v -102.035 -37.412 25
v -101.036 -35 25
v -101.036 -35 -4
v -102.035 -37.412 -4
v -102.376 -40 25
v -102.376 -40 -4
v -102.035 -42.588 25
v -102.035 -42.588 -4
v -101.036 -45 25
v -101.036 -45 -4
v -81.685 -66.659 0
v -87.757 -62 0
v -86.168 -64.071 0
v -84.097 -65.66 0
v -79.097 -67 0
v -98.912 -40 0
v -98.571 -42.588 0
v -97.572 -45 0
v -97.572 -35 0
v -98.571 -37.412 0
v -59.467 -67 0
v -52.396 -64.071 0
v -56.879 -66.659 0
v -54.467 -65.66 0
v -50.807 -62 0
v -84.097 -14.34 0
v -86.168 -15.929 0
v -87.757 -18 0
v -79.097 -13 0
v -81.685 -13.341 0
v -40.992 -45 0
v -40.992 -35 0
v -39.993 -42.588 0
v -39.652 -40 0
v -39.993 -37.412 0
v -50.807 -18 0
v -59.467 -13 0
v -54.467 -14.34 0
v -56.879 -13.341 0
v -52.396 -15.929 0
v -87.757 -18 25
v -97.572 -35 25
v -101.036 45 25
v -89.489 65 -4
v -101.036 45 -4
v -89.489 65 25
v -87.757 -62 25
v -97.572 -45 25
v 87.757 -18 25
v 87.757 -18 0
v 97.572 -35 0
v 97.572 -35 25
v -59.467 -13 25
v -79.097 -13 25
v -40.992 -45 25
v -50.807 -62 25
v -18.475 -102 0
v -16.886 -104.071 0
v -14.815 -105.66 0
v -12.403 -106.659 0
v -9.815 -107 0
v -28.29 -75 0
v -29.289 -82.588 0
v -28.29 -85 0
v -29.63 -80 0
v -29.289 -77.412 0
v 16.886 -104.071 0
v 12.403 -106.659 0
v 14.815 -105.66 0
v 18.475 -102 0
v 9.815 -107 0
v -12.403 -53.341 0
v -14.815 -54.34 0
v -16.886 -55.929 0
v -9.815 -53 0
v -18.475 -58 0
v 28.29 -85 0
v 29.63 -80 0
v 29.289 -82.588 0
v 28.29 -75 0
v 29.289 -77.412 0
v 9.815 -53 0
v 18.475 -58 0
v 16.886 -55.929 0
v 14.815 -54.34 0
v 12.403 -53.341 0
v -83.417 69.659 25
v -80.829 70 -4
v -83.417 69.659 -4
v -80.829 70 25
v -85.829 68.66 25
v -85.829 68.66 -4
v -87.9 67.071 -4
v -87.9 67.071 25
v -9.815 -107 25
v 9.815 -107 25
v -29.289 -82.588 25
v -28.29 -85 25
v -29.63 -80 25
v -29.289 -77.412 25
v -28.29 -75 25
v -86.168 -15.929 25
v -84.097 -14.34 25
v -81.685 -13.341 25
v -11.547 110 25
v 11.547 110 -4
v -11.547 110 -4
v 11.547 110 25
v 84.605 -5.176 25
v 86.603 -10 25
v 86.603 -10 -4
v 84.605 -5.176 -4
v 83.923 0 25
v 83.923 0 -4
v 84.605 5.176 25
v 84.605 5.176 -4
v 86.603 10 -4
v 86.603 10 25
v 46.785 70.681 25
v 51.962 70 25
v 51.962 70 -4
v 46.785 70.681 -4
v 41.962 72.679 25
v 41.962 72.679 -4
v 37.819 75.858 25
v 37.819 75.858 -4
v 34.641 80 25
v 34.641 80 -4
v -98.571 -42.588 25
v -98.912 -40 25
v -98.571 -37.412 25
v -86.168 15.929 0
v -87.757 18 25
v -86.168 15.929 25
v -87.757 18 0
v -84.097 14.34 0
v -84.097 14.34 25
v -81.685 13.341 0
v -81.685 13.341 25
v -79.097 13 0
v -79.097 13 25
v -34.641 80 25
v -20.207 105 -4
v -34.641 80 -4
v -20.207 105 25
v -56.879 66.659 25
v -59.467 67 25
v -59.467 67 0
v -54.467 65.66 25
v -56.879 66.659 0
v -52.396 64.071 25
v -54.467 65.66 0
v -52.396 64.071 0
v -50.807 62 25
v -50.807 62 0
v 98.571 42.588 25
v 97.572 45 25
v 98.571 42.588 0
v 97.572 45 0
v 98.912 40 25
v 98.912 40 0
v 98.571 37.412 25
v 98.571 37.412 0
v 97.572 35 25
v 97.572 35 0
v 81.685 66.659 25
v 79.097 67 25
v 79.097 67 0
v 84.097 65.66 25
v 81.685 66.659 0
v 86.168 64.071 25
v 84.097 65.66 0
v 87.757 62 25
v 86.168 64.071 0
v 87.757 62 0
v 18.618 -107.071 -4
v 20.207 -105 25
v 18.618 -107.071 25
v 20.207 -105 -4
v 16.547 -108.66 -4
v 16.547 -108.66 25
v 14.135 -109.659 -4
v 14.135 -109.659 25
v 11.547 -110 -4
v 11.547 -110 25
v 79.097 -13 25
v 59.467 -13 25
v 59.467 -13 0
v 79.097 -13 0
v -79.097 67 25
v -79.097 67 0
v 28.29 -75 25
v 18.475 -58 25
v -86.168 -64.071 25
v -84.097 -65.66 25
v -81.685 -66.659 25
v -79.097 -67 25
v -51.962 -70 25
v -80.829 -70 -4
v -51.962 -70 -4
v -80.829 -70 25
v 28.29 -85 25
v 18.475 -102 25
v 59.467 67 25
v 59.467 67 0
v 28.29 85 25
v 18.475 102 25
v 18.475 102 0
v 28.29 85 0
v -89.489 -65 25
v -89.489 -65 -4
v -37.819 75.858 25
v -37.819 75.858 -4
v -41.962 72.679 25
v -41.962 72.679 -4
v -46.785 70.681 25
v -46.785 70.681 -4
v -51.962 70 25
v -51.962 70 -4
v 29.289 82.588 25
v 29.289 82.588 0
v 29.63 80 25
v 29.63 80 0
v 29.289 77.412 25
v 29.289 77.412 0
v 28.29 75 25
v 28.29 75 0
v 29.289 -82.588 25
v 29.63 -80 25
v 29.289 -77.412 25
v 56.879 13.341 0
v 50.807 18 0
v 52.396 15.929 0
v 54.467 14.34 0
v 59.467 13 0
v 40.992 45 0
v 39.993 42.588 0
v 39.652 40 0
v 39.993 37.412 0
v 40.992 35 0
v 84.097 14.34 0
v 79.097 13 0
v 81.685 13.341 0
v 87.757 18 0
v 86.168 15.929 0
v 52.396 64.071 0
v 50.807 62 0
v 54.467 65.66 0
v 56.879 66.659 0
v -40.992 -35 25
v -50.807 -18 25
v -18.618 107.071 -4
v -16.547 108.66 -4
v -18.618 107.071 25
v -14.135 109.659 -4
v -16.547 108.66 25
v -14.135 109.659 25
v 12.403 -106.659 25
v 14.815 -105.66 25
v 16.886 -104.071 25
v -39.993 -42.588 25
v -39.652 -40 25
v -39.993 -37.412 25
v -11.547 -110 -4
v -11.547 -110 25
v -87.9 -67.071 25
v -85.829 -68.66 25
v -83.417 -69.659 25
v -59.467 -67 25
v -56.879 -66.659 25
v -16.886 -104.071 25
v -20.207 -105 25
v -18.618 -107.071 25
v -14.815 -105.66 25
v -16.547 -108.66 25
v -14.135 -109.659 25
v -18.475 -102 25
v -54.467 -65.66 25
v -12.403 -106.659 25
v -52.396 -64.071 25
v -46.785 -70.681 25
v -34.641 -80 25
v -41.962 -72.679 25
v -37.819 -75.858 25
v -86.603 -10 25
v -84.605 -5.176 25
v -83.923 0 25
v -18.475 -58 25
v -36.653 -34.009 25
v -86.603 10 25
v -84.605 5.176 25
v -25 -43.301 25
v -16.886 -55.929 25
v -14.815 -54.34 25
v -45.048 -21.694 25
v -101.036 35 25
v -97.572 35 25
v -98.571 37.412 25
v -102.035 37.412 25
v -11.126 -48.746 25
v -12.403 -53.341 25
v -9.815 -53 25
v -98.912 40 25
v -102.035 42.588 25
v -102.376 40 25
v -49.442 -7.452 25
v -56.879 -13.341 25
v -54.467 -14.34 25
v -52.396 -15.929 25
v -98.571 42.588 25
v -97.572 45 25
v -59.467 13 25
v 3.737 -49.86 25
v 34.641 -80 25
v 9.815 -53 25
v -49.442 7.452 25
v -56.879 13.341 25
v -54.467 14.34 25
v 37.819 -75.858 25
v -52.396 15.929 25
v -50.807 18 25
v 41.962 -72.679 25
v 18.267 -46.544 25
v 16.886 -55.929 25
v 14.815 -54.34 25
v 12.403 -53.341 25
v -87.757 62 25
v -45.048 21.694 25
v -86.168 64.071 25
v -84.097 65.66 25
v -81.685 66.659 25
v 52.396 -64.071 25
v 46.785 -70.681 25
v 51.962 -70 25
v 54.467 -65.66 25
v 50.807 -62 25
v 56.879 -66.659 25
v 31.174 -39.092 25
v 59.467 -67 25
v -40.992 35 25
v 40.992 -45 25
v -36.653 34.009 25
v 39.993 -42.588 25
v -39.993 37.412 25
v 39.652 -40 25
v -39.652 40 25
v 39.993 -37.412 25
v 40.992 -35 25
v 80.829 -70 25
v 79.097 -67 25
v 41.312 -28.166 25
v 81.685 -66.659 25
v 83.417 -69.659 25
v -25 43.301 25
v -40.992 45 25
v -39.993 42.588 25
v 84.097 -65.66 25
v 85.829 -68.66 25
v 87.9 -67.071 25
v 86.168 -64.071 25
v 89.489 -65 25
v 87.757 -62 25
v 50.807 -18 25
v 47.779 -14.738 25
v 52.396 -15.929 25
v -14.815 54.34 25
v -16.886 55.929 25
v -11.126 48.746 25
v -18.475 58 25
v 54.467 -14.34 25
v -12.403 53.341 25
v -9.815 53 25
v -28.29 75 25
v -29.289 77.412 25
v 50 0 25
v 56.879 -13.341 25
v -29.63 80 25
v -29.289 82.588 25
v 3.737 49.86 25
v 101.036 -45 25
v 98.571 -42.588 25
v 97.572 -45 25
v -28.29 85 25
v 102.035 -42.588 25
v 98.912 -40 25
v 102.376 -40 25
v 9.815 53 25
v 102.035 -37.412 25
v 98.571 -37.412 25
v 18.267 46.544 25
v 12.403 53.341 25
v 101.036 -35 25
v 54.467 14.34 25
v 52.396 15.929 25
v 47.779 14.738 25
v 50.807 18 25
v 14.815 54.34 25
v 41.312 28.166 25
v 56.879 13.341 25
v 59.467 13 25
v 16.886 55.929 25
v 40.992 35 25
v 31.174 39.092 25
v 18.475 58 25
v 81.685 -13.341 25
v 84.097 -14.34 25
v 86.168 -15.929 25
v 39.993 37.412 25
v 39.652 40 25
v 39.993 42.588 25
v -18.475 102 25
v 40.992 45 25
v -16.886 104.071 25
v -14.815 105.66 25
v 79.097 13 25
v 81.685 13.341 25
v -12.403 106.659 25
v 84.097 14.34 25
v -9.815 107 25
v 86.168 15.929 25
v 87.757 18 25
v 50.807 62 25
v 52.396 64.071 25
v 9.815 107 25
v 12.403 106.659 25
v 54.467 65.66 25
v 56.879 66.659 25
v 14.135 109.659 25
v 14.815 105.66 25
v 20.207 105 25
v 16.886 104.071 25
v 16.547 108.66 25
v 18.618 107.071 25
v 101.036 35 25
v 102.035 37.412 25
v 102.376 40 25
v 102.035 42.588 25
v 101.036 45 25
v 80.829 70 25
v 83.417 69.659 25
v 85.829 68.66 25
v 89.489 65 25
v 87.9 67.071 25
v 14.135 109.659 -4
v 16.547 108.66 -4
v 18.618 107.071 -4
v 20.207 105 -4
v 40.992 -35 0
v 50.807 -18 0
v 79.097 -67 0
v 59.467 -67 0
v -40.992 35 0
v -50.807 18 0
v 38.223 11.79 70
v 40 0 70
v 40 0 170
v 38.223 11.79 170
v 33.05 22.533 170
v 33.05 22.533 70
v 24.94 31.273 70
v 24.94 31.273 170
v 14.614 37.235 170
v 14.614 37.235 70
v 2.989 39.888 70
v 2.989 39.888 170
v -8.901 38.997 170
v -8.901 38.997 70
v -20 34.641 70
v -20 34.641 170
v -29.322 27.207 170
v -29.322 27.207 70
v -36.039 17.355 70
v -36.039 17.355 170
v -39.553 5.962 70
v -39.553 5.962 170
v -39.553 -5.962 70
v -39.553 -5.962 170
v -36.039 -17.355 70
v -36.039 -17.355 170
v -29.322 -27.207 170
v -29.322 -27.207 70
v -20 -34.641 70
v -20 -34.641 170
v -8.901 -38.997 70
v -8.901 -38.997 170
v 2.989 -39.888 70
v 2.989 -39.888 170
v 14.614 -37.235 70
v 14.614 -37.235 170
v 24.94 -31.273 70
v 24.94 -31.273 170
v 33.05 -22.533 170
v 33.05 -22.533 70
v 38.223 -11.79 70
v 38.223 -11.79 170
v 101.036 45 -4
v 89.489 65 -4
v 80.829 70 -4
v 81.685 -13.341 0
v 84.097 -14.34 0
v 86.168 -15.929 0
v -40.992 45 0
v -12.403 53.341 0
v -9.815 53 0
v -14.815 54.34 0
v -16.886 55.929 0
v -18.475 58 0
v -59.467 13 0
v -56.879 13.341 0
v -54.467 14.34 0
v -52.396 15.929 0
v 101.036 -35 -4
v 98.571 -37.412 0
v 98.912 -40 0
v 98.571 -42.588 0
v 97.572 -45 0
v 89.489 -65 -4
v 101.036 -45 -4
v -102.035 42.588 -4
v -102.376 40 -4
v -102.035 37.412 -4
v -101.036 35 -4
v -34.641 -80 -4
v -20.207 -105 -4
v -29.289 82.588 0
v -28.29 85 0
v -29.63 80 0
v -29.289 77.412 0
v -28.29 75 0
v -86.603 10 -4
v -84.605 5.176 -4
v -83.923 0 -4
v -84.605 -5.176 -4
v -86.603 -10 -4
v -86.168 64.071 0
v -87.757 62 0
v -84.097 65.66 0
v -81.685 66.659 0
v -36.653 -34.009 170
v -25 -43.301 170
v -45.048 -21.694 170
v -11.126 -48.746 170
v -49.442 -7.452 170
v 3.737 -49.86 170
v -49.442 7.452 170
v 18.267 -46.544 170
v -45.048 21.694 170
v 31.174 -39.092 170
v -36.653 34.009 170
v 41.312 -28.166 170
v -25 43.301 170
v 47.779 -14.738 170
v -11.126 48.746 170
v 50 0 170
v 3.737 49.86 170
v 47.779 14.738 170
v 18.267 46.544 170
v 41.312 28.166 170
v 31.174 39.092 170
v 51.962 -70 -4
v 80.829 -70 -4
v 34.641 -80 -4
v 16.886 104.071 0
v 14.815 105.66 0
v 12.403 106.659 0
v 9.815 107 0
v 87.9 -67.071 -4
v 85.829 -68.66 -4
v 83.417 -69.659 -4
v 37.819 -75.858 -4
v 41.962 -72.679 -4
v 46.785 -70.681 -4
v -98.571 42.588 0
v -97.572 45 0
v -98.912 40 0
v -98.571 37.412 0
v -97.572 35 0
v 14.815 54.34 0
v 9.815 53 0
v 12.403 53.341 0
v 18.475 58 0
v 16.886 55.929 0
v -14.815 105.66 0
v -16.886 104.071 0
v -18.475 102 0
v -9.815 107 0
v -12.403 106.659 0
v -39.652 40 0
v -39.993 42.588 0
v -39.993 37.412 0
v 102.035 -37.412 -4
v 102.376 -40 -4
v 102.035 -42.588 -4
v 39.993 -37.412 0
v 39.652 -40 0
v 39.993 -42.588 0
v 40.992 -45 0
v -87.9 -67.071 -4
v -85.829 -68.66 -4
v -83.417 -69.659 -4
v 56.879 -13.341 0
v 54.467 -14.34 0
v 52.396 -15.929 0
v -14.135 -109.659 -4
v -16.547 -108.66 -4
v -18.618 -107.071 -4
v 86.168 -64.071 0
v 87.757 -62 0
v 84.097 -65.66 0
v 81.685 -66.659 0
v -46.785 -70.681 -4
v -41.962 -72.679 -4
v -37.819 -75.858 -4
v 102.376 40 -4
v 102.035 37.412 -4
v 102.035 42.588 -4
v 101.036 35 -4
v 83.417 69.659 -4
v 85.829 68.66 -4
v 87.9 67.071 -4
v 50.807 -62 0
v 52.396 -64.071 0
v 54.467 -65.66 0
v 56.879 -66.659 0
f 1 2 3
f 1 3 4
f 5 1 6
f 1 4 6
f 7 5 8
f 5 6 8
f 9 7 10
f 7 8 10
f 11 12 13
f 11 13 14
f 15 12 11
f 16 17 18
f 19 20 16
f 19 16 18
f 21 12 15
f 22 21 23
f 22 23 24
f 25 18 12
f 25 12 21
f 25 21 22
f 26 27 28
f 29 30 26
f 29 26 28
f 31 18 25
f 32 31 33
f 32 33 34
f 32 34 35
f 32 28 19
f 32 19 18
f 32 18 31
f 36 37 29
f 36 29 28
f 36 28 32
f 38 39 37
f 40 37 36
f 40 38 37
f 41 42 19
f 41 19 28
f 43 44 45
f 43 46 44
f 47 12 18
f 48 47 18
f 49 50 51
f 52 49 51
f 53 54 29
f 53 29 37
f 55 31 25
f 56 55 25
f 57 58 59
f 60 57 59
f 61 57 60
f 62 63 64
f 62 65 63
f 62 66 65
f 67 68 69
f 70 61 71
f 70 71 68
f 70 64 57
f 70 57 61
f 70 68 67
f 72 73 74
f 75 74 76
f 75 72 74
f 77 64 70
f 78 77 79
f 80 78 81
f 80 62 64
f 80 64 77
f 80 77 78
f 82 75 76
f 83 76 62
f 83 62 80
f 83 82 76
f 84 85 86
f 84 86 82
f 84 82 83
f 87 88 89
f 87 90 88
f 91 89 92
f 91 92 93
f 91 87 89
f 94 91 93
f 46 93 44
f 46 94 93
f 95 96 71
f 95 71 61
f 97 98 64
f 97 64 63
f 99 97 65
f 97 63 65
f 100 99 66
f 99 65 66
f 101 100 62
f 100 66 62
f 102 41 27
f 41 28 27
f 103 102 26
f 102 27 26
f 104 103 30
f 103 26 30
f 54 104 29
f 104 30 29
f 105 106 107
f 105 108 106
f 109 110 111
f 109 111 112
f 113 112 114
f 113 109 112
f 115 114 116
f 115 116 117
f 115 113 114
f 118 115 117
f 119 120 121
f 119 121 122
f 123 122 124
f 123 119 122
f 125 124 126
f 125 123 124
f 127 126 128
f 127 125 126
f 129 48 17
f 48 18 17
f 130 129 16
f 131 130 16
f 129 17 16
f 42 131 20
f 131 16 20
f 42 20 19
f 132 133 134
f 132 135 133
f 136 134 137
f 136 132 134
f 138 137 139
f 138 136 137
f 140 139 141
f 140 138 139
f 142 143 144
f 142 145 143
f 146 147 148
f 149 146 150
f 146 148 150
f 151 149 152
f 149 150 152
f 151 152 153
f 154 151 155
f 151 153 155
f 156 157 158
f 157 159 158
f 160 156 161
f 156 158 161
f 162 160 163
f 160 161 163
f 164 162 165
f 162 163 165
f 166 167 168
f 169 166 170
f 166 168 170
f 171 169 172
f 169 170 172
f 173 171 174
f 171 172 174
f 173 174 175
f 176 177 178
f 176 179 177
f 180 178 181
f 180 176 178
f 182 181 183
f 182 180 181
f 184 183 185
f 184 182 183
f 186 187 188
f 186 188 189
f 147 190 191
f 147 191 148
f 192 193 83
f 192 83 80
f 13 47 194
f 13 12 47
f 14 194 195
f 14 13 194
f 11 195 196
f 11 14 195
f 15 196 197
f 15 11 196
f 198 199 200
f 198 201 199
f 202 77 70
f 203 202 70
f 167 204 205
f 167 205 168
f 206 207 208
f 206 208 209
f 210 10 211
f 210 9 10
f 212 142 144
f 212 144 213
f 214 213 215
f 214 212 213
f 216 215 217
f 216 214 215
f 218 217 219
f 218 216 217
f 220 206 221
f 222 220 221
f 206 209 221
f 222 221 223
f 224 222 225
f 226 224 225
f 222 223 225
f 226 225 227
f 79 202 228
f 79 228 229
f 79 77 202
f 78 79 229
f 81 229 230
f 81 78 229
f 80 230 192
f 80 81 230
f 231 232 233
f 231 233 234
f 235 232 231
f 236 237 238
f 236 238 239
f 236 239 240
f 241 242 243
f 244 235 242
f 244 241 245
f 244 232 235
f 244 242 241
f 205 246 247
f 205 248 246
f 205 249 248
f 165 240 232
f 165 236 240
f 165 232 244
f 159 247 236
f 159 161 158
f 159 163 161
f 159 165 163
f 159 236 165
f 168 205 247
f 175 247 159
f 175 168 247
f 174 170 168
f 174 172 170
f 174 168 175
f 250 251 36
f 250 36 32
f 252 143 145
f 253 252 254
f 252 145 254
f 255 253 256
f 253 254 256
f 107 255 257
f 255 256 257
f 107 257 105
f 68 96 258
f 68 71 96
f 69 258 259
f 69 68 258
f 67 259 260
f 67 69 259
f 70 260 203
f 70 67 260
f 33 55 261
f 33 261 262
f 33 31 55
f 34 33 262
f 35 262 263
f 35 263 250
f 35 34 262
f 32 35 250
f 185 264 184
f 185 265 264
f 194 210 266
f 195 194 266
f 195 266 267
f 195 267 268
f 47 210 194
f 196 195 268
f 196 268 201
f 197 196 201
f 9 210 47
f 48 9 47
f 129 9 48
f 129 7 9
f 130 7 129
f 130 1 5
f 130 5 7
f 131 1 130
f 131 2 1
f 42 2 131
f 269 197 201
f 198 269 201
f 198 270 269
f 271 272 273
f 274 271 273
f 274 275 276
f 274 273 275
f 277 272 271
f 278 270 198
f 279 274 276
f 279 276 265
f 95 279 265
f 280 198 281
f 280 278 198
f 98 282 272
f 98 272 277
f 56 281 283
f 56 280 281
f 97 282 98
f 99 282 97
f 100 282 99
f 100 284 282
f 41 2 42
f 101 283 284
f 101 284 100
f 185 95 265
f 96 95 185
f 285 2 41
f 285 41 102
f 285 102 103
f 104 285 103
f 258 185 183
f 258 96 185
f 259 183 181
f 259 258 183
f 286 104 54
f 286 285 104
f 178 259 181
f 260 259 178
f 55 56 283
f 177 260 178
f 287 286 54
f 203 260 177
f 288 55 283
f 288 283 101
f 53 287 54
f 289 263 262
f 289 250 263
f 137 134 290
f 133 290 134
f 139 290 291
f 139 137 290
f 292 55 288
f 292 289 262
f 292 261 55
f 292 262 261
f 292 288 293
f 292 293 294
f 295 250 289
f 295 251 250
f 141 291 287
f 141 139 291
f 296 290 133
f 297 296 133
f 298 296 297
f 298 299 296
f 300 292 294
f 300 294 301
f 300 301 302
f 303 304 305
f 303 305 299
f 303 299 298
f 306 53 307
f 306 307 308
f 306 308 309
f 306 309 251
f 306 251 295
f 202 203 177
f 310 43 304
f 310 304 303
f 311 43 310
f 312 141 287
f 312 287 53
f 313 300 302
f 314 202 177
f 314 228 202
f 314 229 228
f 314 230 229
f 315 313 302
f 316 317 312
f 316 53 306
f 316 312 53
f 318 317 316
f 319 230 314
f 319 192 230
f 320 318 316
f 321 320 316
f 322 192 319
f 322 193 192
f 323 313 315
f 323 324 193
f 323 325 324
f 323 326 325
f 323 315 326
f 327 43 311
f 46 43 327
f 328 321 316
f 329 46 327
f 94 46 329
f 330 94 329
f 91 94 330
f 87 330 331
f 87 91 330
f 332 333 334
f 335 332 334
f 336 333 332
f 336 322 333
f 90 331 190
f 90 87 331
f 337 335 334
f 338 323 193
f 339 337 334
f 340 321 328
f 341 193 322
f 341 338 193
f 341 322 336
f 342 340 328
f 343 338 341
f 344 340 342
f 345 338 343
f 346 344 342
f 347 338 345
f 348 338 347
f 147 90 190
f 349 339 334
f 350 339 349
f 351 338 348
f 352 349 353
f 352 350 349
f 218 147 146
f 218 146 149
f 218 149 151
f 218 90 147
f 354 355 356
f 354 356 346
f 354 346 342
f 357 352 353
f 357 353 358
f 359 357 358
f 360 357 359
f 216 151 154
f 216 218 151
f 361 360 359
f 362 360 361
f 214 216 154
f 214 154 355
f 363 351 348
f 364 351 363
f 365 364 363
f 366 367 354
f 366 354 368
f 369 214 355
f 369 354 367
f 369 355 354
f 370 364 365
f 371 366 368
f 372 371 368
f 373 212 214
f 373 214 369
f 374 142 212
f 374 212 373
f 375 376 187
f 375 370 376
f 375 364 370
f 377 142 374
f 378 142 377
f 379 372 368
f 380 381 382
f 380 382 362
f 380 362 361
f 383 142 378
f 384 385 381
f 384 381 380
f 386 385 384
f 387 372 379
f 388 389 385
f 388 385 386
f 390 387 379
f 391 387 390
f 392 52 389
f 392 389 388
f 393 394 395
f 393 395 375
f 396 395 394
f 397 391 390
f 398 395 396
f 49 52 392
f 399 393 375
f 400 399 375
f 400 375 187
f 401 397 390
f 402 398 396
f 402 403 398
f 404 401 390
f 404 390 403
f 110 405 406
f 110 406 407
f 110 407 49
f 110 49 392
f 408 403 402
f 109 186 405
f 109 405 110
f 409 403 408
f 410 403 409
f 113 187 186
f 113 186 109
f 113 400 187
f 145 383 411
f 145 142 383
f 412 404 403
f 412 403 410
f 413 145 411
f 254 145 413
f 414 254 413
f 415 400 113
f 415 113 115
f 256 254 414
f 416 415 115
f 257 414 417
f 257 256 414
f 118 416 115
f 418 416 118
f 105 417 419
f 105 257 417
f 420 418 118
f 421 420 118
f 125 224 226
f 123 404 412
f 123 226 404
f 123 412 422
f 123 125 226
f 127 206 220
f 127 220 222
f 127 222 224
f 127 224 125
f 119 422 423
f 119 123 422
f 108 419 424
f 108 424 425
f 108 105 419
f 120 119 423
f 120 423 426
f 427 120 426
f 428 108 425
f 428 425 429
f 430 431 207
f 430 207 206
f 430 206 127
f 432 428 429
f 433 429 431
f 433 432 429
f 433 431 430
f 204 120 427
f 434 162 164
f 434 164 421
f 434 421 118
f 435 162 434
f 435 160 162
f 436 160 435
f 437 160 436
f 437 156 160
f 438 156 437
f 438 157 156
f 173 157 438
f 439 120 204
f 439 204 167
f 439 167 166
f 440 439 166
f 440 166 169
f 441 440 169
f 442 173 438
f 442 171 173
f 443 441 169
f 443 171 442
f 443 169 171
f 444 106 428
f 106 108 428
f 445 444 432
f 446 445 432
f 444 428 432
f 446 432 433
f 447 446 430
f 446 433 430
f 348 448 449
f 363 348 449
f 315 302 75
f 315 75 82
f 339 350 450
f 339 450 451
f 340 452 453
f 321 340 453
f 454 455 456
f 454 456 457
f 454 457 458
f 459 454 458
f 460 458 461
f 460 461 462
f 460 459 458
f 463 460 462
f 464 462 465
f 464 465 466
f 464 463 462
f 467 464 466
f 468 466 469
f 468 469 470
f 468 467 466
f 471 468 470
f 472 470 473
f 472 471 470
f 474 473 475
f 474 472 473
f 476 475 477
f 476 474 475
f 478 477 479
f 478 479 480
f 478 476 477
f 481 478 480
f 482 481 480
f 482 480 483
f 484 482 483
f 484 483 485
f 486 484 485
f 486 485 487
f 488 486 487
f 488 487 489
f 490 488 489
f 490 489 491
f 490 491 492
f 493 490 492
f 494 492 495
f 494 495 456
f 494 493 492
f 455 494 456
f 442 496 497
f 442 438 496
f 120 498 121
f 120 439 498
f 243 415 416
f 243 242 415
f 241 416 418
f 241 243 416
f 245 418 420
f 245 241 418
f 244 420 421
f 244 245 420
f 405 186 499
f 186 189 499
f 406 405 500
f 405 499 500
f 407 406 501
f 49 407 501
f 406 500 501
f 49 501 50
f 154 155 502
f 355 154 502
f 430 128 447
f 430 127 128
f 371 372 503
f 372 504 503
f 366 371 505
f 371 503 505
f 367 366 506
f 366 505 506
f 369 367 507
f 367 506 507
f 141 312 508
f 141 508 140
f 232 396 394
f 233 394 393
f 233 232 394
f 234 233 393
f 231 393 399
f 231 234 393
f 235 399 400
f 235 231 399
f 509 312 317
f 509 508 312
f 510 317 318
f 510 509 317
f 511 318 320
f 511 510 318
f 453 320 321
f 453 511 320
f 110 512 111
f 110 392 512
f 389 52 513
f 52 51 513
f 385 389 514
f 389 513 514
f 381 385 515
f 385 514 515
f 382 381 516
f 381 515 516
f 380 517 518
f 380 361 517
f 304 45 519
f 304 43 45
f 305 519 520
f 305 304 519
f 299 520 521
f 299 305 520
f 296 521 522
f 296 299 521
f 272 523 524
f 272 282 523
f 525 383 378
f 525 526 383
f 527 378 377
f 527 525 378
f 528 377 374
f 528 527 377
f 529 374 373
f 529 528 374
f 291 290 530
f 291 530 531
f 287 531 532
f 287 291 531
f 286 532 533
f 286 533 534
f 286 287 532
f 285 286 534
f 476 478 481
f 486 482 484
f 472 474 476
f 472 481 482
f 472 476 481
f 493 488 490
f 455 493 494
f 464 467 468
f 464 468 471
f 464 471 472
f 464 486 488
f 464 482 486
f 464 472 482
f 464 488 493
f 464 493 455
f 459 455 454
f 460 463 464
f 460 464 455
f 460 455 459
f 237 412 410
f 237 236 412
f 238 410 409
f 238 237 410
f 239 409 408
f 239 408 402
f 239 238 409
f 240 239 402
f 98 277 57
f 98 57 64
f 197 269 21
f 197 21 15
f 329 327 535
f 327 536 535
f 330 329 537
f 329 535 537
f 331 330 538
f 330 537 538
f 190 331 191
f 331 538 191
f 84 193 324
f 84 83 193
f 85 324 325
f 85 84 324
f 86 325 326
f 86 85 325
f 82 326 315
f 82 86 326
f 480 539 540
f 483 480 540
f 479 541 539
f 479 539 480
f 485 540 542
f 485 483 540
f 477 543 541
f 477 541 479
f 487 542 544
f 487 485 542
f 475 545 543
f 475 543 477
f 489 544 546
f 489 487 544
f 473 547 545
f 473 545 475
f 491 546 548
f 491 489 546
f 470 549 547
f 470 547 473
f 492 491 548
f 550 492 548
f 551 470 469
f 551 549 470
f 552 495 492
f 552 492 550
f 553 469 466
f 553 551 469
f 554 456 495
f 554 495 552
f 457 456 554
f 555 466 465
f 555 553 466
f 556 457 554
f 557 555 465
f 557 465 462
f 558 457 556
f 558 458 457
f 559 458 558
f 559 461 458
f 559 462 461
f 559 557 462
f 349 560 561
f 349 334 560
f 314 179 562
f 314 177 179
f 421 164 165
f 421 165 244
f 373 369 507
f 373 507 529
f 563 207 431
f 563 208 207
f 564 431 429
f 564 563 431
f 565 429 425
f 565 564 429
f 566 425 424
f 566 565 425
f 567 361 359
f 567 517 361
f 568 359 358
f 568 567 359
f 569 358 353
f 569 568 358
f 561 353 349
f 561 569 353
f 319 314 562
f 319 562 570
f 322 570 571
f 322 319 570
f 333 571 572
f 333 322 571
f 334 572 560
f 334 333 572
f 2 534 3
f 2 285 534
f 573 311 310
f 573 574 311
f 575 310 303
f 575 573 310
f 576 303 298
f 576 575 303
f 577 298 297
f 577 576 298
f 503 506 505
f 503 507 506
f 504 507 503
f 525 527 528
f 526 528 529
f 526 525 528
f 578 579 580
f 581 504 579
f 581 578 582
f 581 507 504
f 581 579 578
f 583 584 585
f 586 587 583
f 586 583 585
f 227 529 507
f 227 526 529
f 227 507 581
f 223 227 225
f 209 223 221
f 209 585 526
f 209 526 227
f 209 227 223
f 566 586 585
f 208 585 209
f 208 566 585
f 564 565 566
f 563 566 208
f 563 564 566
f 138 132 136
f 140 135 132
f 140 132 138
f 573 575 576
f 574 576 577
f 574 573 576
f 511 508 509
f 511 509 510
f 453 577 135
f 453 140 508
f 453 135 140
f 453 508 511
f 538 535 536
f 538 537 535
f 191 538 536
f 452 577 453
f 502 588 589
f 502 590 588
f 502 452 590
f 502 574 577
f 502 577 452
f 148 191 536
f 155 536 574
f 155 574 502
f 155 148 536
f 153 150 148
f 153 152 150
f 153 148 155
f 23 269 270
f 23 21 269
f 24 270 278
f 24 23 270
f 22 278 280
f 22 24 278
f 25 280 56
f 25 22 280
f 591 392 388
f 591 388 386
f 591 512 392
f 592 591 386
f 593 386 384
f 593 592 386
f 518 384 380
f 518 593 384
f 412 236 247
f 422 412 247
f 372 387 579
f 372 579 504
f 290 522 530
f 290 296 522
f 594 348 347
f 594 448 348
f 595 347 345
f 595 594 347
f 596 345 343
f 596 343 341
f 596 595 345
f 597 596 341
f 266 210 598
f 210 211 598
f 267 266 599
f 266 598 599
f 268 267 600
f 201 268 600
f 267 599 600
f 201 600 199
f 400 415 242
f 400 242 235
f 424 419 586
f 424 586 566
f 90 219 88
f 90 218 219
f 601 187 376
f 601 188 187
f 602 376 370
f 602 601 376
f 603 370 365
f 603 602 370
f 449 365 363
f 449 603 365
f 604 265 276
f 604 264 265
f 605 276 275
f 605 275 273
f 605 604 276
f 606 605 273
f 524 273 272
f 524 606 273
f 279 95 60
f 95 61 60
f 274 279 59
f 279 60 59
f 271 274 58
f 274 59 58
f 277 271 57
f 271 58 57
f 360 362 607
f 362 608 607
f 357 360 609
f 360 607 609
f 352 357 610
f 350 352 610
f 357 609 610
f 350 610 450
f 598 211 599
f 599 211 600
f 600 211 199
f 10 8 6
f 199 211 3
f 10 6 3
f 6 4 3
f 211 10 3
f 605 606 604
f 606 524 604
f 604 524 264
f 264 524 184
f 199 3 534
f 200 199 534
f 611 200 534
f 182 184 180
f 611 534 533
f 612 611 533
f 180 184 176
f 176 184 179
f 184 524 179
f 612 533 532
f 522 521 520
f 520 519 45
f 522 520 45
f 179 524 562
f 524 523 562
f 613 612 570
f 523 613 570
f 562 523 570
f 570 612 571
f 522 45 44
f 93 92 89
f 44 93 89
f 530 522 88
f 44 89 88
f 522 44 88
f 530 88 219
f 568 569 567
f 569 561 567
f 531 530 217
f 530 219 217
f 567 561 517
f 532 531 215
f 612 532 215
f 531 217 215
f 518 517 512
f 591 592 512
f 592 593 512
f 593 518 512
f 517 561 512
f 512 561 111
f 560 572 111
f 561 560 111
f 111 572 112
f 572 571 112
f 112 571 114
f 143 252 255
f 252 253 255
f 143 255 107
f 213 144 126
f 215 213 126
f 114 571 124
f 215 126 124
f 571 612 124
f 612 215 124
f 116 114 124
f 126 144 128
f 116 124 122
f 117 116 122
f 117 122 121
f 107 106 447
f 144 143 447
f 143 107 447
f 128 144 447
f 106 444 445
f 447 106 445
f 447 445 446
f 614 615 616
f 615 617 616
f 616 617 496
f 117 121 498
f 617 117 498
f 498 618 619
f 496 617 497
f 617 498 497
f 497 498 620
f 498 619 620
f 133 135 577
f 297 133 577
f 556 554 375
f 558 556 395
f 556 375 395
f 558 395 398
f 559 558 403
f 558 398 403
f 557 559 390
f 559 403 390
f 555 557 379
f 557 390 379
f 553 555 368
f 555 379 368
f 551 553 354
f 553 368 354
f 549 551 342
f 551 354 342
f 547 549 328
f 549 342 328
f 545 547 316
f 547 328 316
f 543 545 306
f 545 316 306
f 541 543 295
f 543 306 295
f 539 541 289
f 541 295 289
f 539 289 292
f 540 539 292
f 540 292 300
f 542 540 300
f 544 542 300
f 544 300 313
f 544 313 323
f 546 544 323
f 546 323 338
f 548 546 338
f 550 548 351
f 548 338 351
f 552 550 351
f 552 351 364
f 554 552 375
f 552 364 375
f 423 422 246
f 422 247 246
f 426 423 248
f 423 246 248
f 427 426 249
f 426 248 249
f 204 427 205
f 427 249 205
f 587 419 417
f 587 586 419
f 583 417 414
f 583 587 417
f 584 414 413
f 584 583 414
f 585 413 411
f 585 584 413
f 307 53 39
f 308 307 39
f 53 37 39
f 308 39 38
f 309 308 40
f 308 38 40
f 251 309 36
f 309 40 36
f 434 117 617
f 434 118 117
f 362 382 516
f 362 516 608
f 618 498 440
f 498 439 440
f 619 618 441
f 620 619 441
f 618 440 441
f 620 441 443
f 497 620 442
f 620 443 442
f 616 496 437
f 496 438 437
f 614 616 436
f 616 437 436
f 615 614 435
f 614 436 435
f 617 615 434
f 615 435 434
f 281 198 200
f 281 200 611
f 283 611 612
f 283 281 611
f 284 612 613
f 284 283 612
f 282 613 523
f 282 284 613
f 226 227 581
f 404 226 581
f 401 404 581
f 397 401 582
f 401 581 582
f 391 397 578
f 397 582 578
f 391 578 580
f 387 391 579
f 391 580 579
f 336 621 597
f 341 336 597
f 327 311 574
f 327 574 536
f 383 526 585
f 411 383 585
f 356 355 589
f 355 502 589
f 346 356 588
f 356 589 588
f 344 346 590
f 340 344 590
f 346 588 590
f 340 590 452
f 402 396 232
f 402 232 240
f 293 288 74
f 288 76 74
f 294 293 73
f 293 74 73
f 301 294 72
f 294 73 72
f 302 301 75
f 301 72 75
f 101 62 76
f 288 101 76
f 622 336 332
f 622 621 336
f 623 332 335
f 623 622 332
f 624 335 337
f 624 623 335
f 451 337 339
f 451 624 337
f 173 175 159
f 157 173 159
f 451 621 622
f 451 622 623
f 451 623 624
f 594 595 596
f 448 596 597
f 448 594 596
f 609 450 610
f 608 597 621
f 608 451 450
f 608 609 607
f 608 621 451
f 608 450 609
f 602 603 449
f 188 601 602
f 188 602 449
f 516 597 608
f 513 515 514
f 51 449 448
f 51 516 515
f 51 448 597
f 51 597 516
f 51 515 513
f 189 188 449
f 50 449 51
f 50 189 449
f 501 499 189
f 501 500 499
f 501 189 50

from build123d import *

# Parameters (mm, degrees)
BOSS_EXTRUDE2_DEPTH = 4
BOSS_EXTRUDE3_START = 25
BOSS_EXTRUDE3_DEPTH = 25
BOSS_EXTRUDE4_START = 25
BASE_SKETCH_4_R     = 50
BASE_SKETCH_4_R_2   = 40
BASE_SKETCH_4_R_3   = 10
BOSS_EXTRUDE4_DEPTH = 40
BOSS_EXTRUDE5_START = 65
BASE_SKETCH_5_R     = 50
BASE_SKETCH_5_R_2   = 40
BASE_SKETCH_5_R_3   = 10
BOSS_EXTRUDE5_DEPTH = 5
BOSS_EXTRUDE6_START = 70
BASE_SKETCH_7_R     = 50
BASE_SKETCH_7_R_2   = 40
BOSS_EXTRUDE6_DEPTH = 100
FILLET1_R           = 10
FILLET2_R           = 10


with BuildPart() as part:
    # Base_Sketch → Boss-Extrude2 (new body)
    with BuildSketch(Plane.XY):
        with BuildLine():
            Line((34.641016151, 80), (17.320508076, 110))
            Line((17.320508076, 110), (-17.320508076, 110))
            Line((-17.320508076, 110), (-34.641016151, 80))
            ThreePointArc((-34.641016151, 80), (-41.961524227, 72.679491924), (-51.961524227, 70))
            Line((-51.961524227, 70), (-86.602540378, 70))
            Line((-86.602540378, 70), (-103.923048454, 40))
            Line((-103.923048454, 40), (-86.602540378, 10))
            ThreePointArc((-86.602540378, 10), (-83.923048454, 0), (-86.602540378, -10))
            Line((-86.602540378, -10), (-103.923048454, -40))
            Line((-103.923048454, -40), (-86.602540378, -70))
            Line((-86.602540378, -70), (-51.961524227, -70))
            ThreePointArc((-51.961524227, -70), (-41.961524227, -72.679491924), (-34.641016151, -80))
            Line((-34.641016151, -80), (-17.320508076, -110))
            Line((-17.320508076, -110), (17.320508076, -110))
            Line((17.320508076, -110), (34.641016151, -80))
            ThreePointArc((34.641016151, -80), (41.961524227, -72.679491924), (51.961524227, -70))
            Line((51.961524227, -70), (86.602540378, -70))
            Line((86.602540378, -70), (103.923048454, -40))
            Line((103.923048454, -40), (86.602540378, -10))
            ThreePointArc((86.602540378, -10), (83.923048454, 0), (86.602540378, 10))
            Line((86.602540378, 10), (103.923048454, 40))
            Line((103.923048454, 40), (86.602540378, 70))
            Line((86.602540378, 70), (51.961524227, 70))
            ThreePointArc((51.961524227, 70), (41.961524227, 72.679491924), (34.641016151, 80))
        make_face()
    extrude(amount=-BOSS_EXTRUDE2_DEPTH)

    # Base_Sketch<3> → Boss-Extrude3 (add)
    with BuildSketch(Plane.XY.offset(BOSS_EXTRUDE3_START)):
        with BuildLine():
            Line((86.602540378, 10), (103.923048454, 40))
            Line((103.923048454, 40), (86.602540378, 70))
            Line((86.602540378, 70), (51.961524227, 70))
            ThreePointArc((51.961524227, 70), (41.961524227, 72.679491924), (34.641016151, 80))
            Line((34.641016151, 80), (17.320508076, 110))
            Line((17.320508076, 110), (-17.320508076, 110))
            Line((-17.320508076, 110), (-34.641016151, 80))
            ThreePointArc((-34.641016151, 80), (-41.961524227, 72.679491924), (-51.961524227, 70))
            Line((-51.961524227, 70), (-86.602540378, 70))
            Line((-86.602540378, 70), (-103.923048454, 40))
            Line((-103.923048454, 40), (-86.602540378, 10))
            ThreePointArc((-86.602540378, 10), (-83.923048454, 0), (-86.602540378, -10))
            Line((-86.602540378, -10), (-103.923048454, -40))
            Line((-103.923048454, -40), (-86.602540378, -70))
            Line((-86.602540378, -70), (-51.961524227, -70))
            ThreePointArc((-51.961524227, -70), (-41.961524227, -72.679491924), (-34.641016151, -80))
            Line((-34.641016151, -80), (-17.320508076, -110))
            Line((-17.320508076, -110), (17.320508076, -110))
            Line((17.320508076, -110), (34.641016151, -80))
            ThreePointArc((34.641016151, -80), (41.961524227, -72.679491924), (51.961524227, -70))
            Line((51.961524227, -70), (86.602540378, -70))
            Line((86.602540378, -70), (103.923048454, -40))
            Line((103.923048454, -40), (86.602540378, -10))
            ThreePointArc((86.602540378, -10), (83.923048454, 0), (86.602540378, 10))
        make_face()
        Polygon((-31.176914536, 80), (-15.588457268, 107), (15.588457268, 107), (31.176914536, 80), (15.588457268, 53), (-15.588457268, 53), align=None, mode=Mode.SUBTRACT)
        Polygon((53.693575035, 67), (84.870489571, 67), (100.458946839, 40), (84.870489571, 13), (53.693575035, 13), (38.105117767, 40), align=None, mode=Mode.SUBTRACT)
        Polygon((-84.870489571, 67), (-53.693575035, 67), (-38.105117767, 40), (-53.693575035, 13), (-84.870489571, 13), (-100.458946839, 40), align=None, mode=Mode.SUBTRACT)
        Polygon((-100.458946839, -40), (-84.870489571, -13), (-53.693575035, -13), (-38.105117767, -40), (-53.693575035, -67), (-84.870489571, -67), align=None, mode=Mode.SUBTRACT)
        Polygon((84.870489571, -13), (100.458946839, -40), (84.870489571, -67), (53.693575035, -67), (38.105117767, -40), (53.693575035, -13), align=None, mode=Mode.SUBTRACT)
        Polygon((-15.588457268, -107), (-31.176914536, -80), (-15.588457268, -53), (15.588457268, -53), (31.176914536, -80), (15.588457268, -107), align=None, mode=Mode.SUBTRACT)
    extrude(amount=-BOSS_EXTRUDE3_DEPTH)

    # Base_Sketch<4> → Boss-Extrude4 (add)
    # profile 1 of 3: a face of its own
    with BuildSketch(Plane.XY.offset(BOSS_EXTRUDE4_START)):
        Circle(BASE_SKETCH_4_R)
        Circle(BASE_SKETCH_4_R_2, mode=Mode.SUBTRACT)
    # profile 2 of 3: a face of its own
    with BuildSketch(Plane.XY.offset(BOSS_EXTRUDE4_START)):
        Circle(BASE_SKETCH_4_R_2)
        Circle(BASE_SKETCH_4_R_3, mode=Mode.SUBTRACT)
    # profile 3 of 3: a face of its own
    with BuildSketch(Plane.XY.offset(BOSS_EXTRUDE4_START)):
        Circle(BASE_SKETCH_4_R_3)
    extrude(amount=BOSS_EXTRUDE4_DEPTH)

    # Base_Sketch<5> → Boss-Extrude5 (add)
    # profile 1 of 3: a face of its own
    with BuildSketch(Plane.XY.offset(BOSS_EXTRUDE5_START)):
        Circle(BASE_SKETCH_5_R)
        Circle(BASE_SKETCH_5_R_2, mode=Mode.SUBTRACT)
    # profile 2 of 3: a face of its own
    with BuildSketch(Plane.XY.offset(BOSS_EXTRUDE5_START)):
        Circle(BASE_SKETCH_5_R_2)
        Circle(BASE_SKETCH_5_R_3, mode=Mode.SUBTRACT)
    # profile 3 of 3: a face of its own
    with BuildSketch(Plane.XY.offset(BOSS_EXTRUDE5_START)):
        Circle(BASE_SKETCH_5_R_3)
    extrude(amount=BOSS_EXTRUDE5_DEPTH)

    # Base_Sketch<7> → Boss-Extrude6 (add)
    with BuildSketch(Plane.XY.offset(BOSS_EXTRUDE6_START)):
        Circle(BASE_SKETCH_7_R)
        Circle(BASE_SKETCH_7_R_2, mode=Mode.SUBTRACT)
    extrude(amount=BOSS_EXTRUDE6_DEPTH)

    # Fillet1
    fillet1_edges = [part.edges().sort_by_distance(p)[0] for p in [
        (-15.588457268, 107, 12.5),
        (-31.176914536, 80, 12.5),
        (-15.588457268, 53, 12.5),
        (15.588457268, 53, 12.5),
        (31.176914536, 80, 12.5),
        (15.588457268, 107, 12.5),
        (-17.320508076, 110, 10.5),
        (17.320508076, 110, 10.5),
    ]]
    fillet(fillet1_edges, radius=FILLET1_R)

    # Fillet2
    fillet2_edges = [part.edges().sort_by_distance(p)[0] for p in [
        (-15.588457268, -107, 12.5),
        (15.588457268, -107, 12.5),
        (31.176914536, -80, 12.5),
        (15.588457268, -53, 12.5),
        (-15.588457268, -53, 12.5),
        (-31.176914536, -80, 12.5),
        (-100.458946839, -40, 12.5),
        (-84.870489571, -67, 12.5),
        (-53.693575035, -67, 12.5),
        (-38.105117767, -40, 12.5),
        (-53.693575035, -13, 12.5),
        (-84.870489571, -13, 12.5),
        (-84.870489571, 67, 12.5),
        (-100.458946839, 40, 12.5),
        (-84.870489571, 13, 12.5),
        (-53.693575035, 13, 12.5),
        (-38.105117767, 40, 12.5),
        (-53.693575035, 67, 12.5),
        (100.458946839, 40, 12.5),
        (84.870489571, 67, 12.5),
        (53.693575035, 67, 12.5),
        (38.105117767, 40, 12.5),
        (53.693575035, 13, 12.5),
        (84.870489571, 13, 12.5),
        (84.870489571, -13, 12.5),
        (53.693575035, -13, 12.5),
        (38.105117767, -40, 12.5),
        (53.693575035, -67, 12.5),
        (84.870489571, -67, 12.5),
        (100.458946839, -40, 12.5),
        (103.923048454, -40, 10.5),
        (86.602540378, -70, 10.5),
        (17.320508076, -110, 10.5),
        (-17.320508076, -110, 10.5),
        (-86.602540378, -70, 10.5),
        (-103.923048454, -40, 10.5),
        (-103.923048454, 40, 10.5),
        (-86.602540378, 70, 10.5),
        (86.602540378, 70, 10.5),
        (103.923048454, 40, 10.5),
    ]]
    fillet(fillet2_edges, radius=FILLET2_R)


solid = part.part
